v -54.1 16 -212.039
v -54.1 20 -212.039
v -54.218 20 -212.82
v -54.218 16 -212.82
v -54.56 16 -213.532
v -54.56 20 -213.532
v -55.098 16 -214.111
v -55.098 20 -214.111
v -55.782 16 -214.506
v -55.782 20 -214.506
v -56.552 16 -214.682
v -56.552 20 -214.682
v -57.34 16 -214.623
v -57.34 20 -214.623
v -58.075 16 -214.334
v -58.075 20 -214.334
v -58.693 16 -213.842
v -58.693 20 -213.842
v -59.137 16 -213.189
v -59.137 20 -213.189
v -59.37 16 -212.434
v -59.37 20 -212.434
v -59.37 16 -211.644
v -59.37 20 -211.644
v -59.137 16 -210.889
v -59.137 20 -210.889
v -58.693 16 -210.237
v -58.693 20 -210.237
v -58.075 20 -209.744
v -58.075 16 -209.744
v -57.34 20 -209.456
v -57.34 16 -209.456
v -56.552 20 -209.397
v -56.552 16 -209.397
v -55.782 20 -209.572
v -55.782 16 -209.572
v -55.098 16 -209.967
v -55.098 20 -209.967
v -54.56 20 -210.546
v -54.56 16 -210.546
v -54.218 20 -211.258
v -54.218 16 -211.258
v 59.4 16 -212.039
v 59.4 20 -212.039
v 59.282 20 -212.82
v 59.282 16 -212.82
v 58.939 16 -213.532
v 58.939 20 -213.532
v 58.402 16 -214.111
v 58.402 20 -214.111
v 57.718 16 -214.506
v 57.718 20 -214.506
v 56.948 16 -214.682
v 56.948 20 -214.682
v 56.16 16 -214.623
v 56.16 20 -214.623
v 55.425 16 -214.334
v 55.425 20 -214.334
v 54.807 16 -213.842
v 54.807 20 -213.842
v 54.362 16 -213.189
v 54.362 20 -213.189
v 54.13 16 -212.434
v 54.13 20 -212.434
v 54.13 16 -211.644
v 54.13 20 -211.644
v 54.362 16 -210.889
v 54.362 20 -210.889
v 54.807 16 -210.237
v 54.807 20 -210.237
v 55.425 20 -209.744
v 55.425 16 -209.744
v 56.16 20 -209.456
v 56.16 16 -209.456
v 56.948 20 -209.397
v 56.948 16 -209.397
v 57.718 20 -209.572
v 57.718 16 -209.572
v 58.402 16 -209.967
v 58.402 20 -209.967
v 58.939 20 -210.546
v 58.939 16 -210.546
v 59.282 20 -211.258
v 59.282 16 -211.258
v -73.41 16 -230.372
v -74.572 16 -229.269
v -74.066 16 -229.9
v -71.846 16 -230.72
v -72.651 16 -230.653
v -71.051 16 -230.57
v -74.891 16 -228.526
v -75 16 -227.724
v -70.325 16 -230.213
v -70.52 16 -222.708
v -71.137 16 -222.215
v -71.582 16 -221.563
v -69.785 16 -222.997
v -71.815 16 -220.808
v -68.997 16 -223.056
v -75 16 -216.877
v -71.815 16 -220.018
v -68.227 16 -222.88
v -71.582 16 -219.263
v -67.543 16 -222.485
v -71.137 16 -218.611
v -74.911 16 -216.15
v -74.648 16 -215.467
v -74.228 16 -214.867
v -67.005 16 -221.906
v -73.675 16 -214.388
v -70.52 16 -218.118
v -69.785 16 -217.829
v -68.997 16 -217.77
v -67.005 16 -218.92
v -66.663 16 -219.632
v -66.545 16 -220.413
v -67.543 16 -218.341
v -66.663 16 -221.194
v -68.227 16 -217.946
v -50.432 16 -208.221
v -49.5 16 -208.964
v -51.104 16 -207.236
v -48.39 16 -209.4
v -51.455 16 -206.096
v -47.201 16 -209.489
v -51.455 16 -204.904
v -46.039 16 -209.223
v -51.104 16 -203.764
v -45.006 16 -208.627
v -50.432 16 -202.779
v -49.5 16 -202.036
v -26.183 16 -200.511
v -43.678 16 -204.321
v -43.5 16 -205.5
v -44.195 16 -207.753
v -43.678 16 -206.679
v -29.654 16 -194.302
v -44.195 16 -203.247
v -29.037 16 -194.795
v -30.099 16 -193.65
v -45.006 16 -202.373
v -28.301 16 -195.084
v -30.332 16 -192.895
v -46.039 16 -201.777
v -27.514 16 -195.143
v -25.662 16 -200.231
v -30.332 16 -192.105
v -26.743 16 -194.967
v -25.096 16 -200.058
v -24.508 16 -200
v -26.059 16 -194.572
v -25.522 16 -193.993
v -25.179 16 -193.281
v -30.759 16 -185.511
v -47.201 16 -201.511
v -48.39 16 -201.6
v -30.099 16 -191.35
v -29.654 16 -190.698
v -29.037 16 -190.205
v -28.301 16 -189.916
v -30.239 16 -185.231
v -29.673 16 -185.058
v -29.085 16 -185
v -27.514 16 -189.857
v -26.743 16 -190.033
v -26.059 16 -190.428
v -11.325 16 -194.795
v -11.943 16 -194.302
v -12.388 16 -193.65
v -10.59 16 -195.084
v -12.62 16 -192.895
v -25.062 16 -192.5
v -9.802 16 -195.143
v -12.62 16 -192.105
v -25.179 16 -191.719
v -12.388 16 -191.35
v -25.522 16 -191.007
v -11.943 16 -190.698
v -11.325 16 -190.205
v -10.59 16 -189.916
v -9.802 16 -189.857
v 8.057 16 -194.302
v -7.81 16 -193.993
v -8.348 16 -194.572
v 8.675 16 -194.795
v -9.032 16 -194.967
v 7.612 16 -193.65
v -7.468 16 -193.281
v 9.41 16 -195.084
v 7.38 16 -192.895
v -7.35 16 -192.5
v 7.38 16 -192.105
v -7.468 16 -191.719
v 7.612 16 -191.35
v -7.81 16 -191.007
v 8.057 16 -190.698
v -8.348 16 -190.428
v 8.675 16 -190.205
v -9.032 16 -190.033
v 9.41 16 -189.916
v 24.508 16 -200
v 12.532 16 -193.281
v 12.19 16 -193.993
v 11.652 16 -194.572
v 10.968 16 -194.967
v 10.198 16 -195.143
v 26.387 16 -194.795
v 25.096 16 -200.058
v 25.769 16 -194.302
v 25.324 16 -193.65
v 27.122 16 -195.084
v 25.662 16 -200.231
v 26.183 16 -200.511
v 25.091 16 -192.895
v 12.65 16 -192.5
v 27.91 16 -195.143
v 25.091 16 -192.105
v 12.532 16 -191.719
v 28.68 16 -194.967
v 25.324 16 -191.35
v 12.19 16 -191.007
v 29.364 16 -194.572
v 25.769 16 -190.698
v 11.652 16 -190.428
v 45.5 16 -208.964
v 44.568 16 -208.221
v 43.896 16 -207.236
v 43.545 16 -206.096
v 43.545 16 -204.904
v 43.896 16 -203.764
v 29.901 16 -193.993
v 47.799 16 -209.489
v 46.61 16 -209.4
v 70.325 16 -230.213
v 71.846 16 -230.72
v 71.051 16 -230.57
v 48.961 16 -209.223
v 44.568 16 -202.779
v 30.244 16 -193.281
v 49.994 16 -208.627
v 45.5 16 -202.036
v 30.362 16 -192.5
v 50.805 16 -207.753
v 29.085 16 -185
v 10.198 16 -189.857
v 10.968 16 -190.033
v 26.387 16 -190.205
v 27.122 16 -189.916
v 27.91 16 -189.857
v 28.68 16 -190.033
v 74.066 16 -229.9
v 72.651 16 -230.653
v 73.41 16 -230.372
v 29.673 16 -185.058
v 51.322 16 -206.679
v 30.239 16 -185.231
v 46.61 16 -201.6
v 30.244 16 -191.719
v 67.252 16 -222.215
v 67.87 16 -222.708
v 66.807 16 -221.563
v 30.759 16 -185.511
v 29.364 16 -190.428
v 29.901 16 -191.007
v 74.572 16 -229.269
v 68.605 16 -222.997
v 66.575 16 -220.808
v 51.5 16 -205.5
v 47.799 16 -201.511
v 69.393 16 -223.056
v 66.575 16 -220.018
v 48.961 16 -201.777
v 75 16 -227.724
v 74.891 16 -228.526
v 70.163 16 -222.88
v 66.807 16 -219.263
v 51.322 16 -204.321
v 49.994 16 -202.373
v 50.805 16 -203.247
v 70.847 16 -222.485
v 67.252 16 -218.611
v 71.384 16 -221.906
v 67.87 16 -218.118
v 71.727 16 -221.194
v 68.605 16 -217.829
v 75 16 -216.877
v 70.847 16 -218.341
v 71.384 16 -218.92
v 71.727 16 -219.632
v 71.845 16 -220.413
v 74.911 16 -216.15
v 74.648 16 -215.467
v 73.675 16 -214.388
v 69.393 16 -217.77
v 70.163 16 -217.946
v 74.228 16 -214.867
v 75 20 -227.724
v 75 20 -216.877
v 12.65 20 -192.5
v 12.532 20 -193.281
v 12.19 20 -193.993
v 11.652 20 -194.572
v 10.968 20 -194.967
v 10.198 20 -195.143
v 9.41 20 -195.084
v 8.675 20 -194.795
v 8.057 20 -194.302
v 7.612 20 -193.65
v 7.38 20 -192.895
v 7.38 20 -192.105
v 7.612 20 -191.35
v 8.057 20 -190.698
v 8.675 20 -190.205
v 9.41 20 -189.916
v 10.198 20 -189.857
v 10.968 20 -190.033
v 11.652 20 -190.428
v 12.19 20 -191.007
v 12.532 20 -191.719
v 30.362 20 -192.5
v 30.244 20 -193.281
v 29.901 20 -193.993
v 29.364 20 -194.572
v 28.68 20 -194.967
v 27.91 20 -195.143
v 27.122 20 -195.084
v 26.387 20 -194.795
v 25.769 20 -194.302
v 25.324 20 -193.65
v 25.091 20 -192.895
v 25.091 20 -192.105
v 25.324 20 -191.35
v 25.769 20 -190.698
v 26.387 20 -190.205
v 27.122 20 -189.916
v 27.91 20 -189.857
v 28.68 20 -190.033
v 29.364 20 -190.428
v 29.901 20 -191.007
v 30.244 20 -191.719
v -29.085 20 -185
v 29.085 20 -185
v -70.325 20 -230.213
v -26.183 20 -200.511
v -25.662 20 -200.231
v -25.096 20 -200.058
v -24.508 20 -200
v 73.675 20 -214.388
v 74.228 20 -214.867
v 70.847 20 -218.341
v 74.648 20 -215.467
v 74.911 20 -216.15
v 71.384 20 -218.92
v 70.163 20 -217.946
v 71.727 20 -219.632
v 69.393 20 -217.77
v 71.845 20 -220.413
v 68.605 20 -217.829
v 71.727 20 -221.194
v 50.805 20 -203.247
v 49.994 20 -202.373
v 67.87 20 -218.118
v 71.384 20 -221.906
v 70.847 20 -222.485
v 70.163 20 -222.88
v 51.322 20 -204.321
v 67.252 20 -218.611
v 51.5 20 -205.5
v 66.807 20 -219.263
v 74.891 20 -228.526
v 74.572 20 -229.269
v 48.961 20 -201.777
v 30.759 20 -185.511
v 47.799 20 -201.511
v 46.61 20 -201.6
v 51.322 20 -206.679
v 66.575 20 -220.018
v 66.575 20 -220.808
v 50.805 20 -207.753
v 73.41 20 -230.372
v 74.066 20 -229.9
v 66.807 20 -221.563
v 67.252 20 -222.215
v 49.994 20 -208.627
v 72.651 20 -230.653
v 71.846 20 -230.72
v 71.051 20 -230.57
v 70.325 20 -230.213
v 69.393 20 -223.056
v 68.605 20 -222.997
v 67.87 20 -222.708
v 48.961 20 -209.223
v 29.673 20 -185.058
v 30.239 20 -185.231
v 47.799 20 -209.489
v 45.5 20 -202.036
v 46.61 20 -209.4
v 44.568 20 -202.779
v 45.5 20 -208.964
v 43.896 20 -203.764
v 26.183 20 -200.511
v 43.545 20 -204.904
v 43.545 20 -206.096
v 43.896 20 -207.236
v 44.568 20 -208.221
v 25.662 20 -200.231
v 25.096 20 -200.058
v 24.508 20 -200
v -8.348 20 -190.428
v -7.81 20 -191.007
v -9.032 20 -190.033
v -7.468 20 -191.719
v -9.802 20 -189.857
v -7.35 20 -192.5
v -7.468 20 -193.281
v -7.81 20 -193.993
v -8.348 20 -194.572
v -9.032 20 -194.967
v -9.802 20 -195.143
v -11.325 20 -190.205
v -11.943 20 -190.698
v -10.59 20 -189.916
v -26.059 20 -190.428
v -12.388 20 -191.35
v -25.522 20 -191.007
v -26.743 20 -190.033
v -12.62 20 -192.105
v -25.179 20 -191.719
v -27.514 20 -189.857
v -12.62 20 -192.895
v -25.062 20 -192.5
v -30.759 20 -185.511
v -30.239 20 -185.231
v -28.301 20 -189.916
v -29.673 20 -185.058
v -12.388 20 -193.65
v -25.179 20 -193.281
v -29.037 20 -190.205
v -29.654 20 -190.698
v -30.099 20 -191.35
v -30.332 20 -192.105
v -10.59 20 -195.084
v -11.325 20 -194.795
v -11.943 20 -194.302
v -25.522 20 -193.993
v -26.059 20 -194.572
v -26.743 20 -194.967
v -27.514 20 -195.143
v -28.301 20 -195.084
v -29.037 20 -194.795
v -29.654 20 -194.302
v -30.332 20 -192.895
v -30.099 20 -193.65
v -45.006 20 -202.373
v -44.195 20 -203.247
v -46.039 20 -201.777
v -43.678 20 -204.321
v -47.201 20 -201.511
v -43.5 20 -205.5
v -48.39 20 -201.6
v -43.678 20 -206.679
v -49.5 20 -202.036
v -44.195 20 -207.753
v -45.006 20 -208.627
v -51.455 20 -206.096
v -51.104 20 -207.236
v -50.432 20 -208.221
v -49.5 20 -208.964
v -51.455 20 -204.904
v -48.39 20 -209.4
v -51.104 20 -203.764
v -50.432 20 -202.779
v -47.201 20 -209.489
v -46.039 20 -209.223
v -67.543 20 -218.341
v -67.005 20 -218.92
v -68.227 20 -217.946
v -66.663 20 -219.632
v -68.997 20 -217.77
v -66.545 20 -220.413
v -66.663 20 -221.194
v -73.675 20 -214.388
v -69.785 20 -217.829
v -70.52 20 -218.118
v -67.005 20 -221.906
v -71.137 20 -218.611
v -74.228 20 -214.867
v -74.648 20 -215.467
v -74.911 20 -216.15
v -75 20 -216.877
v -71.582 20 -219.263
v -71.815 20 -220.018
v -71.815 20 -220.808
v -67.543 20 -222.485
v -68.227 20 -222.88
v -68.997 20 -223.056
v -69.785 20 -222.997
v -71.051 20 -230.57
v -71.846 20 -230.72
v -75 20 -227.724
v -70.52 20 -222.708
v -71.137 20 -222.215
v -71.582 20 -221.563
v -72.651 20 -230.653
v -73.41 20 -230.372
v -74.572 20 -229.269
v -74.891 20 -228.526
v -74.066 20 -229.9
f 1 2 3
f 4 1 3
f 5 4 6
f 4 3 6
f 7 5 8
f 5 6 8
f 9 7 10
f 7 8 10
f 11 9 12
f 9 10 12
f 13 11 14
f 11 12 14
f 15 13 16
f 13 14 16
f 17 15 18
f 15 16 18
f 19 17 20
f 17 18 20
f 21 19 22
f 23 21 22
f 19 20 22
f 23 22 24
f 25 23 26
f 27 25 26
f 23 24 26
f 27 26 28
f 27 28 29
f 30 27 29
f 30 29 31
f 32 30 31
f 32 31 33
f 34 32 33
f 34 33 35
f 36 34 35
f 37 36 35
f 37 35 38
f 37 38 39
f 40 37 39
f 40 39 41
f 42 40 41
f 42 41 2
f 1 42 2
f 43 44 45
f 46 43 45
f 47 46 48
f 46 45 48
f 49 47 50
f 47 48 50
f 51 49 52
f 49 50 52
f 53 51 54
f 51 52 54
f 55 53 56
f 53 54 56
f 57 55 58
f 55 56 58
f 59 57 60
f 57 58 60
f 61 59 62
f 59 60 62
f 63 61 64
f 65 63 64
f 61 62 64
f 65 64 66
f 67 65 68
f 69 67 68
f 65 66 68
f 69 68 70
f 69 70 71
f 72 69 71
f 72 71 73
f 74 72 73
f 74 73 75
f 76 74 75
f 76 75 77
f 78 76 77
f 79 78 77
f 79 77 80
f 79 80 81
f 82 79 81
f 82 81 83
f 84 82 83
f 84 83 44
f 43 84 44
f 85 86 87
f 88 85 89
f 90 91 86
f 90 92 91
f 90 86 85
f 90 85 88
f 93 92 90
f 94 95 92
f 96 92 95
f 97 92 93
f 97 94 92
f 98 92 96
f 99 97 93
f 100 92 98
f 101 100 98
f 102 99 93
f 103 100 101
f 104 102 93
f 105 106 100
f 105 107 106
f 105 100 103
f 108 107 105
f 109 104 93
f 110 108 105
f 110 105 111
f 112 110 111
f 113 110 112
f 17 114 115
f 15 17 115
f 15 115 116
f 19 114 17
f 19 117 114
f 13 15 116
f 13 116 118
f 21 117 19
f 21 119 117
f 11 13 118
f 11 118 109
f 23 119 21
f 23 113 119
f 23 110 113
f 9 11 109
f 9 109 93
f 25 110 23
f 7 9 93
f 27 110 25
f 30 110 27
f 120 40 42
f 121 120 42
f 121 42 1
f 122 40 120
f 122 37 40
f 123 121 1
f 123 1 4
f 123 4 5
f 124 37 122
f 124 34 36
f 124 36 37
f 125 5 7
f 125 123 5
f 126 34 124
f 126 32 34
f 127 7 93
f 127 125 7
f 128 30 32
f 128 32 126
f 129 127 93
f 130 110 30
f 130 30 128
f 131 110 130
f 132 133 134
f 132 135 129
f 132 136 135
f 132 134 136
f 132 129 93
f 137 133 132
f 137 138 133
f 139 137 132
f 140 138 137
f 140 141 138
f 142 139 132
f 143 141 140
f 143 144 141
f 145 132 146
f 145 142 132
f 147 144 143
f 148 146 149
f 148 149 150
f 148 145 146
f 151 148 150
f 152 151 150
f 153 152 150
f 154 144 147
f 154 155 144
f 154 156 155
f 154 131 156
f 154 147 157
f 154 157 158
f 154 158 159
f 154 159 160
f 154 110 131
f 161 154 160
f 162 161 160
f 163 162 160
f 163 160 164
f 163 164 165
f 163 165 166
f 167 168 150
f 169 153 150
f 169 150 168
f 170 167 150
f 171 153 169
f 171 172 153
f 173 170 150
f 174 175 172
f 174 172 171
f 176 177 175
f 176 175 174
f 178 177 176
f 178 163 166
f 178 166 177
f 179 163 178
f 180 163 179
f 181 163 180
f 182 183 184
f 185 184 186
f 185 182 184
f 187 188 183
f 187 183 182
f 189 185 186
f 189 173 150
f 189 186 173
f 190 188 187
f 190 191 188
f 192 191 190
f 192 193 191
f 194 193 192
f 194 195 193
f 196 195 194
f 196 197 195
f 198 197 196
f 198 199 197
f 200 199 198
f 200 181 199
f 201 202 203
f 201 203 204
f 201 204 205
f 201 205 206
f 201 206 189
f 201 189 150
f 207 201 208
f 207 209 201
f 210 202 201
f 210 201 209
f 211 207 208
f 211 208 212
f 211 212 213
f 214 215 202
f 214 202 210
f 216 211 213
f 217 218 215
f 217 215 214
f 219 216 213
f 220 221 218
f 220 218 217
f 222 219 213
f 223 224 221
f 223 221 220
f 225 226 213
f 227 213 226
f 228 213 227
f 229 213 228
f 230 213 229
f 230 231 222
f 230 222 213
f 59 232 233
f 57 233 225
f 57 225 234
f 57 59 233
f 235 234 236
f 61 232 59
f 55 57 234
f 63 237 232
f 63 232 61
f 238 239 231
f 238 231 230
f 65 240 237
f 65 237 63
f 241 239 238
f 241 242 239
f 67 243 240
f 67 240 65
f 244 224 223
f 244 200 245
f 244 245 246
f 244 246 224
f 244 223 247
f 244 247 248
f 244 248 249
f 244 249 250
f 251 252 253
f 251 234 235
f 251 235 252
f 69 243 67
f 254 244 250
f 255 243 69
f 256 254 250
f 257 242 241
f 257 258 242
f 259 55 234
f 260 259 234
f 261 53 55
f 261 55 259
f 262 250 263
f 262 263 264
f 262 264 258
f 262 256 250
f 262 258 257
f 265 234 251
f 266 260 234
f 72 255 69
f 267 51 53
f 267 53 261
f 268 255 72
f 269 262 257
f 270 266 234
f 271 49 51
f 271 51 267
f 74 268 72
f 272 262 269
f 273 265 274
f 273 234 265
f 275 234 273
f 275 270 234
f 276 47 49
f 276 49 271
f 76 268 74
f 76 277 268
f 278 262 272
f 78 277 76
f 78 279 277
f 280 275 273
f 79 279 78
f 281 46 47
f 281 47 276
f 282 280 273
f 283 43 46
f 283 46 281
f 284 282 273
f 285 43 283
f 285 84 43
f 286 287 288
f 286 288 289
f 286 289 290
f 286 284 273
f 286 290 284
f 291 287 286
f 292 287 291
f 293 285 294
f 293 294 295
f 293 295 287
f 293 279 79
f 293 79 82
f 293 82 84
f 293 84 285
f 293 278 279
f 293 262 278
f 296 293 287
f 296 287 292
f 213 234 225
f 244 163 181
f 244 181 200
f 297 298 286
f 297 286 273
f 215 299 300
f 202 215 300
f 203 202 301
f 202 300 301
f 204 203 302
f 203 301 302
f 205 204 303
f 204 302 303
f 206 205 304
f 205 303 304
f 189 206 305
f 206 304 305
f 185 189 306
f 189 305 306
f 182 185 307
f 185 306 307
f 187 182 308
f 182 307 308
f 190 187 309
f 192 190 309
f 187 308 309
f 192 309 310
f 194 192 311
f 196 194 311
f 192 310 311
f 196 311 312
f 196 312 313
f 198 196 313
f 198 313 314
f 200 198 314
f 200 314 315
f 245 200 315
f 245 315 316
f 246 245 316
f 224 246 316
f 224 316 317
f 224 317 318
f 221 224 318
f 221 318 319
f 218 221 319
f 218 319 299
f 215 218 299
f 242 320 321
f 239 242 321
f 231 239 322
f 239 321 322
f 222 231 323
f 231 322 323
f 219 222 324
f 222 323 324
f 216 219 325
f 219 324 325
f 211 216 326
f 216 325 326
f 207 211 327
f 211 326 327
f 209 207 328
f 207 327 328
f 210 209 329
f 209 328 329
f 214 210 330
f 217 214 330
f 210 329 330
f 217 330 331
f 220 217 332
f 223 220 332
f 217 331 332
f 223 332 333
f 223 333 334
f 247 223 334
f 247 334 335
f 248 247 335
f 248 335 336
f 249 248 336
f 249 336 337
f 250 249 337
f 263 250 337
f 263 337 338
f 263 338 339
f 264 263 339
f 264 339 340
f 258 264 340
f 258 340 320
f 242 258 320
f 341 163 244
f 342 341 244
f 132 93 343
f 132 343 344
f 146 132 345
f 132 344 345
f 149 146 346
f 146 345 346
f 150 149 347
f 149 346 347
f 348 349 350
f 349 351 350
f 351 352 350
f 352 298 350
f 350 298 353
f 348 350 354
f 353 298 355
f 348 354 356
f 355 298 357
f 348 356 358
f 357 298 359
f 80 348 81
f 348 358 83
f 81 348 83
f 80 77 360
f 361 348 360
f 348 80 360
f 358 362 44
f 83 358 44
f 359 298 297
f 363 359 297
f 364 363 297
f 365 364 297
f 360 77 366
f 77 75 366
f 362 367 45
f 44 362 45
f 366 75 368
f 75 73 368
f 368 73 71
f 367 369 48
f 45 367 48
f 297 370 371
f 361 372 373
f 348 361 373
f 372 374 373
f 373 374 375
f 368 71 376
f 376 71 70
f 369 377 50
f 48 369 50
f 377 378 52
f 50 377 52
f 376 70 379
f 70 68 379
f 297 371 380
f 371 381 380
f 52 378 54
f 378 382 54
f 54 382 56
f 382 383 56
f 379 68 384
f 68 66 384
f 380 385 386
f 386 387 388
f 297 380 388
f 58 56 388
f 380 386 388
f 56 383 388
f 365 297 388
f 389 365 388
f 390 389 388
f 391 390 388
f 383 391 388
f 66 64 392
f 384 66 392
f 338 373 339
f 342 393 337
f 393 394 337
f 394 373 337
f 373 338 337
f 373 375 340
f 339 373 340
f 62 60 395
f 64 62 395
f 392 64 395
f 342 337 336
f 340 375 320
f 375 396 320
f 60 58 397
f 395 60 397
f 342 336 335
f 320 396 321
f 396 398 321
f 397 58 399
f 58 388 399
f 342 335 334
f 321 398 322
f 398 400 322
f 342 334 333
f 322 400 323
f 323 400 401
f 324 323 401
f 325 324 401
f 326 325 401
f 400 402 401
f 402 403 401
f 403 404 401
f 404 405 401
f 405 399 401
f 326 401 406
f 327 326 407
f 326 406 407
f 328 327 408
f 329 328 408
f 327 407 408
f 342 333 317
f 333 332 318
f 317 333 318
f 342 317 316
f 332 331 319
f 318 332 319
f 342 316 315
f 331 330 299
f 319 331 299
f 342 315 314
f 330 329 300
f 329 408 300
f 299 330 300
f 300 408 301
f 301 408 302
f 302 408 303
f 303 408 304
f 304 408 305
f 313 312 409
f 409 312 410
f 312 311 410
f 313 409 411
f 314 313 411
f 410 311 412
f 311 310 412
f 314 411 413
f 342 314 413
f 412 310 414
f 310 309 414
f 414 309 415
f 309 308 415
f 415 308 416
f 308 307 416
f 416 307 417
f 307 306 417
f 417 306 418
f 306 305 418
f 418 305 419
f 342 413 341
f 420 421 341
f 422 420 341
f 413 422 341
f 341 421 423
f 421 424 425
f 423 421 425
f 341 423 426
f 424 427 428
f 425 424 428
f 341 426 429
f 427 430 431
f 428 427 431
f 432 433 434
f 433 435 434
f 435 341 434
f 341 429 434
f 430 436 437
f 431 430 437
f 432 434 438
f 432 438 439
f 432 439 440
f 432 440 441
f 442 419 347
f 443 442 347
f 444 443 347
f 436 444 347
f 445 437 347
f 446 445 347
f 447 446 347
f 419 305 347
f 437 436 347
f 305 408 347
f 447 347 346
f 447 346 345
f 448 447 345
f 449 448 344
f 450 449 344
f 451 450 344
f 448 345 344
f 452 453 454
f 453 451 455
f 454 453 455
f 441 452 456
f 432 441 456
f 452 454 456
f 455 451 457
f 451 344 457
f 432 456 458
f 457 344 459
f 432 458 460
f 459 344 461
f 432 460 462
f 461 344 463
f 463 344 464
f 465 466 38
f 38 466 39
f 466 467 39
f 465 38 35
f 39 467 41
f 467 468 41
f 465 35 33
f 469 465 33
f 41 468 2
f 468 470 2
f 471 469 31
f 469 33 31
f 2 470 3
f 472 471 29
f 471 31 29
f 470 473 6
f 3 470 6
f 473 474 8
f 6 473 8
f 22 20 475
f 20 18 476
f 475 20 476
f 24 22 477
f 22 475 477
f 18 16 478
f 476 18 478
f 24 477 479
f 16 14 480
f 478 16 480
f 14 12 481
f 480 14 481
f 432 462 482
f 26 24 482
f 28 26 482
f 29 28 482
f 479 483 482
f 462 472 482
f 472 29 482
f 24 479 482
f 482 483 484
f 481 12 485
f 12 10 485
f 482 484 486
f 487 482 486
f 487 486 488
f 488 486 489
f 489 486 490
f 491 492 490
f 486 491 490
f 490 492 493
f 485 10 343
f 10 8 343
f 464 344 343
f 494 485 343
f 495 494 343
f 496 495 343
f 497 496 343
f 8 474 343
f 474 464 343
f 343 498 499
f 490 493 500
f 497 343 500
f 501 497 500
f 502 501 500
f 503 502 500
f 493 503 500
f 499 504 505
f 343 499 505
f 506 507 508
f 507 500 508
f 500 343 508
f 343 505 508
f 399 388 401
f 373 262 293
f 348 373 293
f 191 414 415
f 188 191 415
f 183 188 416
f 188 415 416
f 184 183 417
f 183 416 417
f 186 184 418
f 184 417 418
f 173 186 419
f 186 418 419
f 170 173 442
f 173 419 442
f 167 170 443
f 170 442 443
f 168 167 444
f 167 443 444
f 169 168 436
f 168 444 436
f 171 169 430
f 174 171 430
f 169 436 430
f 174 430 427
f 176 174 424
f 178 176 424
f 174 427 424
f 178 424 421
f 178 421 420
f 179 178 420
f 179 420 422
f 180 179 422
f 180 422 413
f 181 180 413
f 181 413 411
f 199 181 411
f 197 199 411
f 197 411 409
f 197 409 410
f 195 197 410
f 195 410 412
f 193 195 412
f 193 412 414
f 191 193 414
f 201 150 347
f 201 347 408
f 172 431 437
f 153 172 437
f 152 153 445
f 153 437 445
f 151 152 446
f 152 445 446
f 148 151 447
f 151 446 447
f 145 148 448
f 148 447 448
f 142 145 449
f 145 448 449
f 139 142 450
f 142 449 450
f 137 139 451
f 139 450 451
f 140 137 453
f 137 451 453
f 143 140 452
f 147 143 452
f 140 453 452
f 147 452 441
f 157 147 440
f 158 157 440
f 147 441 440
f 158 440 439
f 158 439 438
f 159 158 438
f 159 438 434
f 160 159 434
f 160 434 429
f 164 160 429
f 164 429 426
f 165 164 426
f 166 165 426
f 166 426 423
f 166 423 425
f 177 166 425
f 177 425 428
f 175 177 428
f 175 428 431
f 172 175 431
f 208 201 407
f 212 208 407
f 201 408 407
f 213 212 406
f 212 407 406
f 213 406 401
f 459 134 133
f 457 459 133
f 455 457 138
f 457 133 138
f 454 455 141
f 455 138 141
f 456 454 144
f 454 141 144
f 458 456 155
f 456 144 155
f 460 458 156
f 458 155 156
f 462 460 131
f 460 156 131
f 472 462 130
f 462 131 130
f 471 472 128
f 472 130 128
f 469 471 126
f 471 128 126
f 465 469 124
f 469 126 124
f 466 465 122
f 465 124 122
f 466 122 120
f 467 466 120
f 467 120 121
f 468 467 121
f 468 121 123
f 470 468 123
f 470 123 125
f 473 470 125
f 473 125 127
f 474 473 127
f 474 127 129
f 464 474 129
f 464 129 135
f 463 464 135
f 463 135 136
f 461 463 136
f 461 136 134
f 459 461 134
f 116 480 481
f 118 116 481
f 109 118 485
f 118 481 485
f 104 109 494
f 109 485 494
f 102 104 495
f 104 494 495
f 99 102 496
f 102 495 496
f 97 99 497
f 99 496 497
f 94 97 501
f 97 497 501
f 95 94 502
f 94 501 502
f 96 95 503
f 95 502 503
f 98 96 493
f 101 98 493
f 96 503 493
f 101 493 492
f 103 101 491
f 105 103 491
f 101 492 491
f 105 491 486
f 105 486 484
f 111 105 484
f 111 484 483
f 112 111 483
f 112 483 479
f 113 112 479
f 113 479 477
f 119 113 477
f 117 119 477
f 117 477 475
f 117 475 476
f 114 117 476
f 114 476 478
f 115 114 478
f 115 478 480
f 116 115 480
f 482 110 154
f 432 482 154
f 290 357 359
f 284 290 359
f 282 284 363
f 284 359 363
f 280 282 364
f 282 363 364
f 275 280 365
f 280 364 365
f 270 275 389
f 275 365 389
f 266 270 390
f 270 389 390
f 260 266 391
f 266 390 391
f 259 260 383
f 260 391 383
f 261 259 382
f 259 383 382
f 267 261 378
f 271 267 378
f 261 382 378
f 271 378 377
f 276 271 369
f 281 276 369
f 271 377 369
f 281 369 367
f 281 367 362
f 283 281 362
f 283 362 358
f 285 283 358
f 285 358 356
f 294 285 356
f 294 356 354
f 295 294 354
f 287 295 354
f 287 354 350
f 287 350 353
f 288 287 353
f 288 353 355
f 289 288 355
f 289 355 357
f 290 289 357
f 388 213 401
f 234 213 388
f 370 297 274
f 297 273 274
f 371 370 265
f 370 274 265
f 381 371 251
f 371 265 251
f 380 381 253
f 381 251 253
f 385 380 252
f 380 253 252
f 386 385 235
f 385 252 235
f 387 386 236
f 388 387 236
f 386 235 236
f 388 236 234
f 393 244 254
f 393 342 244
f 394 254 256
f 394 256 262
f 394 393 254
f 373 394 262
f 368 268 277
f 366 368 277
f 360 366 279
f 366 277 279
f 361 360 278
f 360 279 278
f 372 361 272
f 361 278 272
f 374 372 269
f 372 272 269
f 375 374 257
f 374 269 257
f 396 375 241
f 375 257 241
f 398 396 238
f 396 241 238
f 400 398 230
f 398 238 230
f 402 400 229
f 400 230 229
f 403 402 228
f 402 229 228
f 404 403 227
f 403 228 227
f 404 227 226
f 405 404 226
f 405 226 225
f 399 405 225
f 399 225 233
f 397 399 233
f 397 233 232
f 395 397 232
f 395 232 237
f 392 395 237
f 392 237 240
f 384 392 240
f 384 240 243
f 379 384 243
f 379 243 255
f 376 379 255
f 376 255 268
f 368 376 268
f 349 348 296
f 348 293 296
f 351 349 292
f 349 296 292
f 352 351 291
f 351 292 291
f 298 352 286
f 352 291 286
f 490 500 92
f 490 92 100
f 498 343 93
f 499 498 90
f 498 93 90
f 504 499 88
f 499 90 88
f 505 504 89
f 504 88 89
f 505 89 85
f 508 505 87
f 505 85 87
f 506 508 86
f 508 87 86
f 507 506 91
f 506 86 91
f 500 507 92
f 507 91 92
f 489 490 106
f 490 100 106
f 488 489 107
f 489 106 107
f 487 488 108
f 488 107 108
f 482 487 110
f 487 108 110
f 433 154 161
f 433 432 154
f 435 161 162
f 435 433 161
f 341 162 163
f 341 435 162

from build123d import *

# Parameters (mm, degrees)
SKETCH_1_R               = 275
SKETCH_1_R_2             = 255
EXTRUDE_1_DEPTH          = 10
EXTRUDE_2_DEPTH          = 10
SKETCH_8_R               = 2.65
SKETCH_8_R_2             = 1.65
SKETCH_8_R_3             = 2.15
CUT_EXTRUDE_1_DEPTH      = 21
SKETCH_9_OUTSIDE_W       = 707.614
SKETCH_9_OUTSIDE_H       = 707.614
CUT_EXTRUDE_2_DEPTH      = 21
SKETCH_10_W              = 150
SKETCH_10_H              = 32
CUT_EXTRUDE_3_DEPTH      = 91
SKETCH_11_R              = 275
SKETCH_11_R_2            = 255
CUT_EXTRUDE_4_DEPTH      = 11
CUT_EXTRUDE_4_DEPTH_BACK = 11
FILLET_1_R               = 3
SKETCH_13_R              = 4
CUT_EXTRUDE_6_DEPTH      = 5


with BuildPart() as part:
    # 草图1 → 凸台-拉伸1 (new body)
    with BuildSketch(Plane(origin=(0, 0, 0), x_dir=(1, 0, 0), z_dir=(0, 1, 0))):
        Circle(SKETCH_1_R)
        Circle(SKETCH_1_R_2, mode=Mode.SUBTRACT)
    extrude(amount=EXTRUDE_1_DEPTH)

    # 草图11 → 切除-拉伸4 (cut, two sides)
    with BuildSketch(Plane(origin=(0, 10, 0), x_dir=(1, 0, 0), z_dir=(0, 1, 0))) as cut_extrude_4_sk:
        Circle(SKETCH_11_R)
        Circle(SKETCH_11_R_2, mode=Mode.SUBTRACT)
    extrude(amount=CUT_EXTRUDE_4_DEPTH, mode=Mode.SUBTRACT)
    extrude(cut_extrude_4_sk.sketch, amount=-CUT_EXTRUDE_4_DEPTH_BACK, mode=Mode.SUBTRACT)


with BuildPart() as body_2:
    # 草图2 → 凸台-拉伸2 (new body)
    with BuildSketch(Plane(origin=(0, 10, 0), x_dir=(1, 0, 0), z_dir=(0, 1, 0))):
        with BuildLine():
            Line((-110.525139894, 257.262887824), (-25.423255477, 200))
            Line((-25.423255477, 200), (0, 200))
            Line((0, 200), (25.423255477, 200))
            Line((25.423255477, 200), (110.525139894, 257.262887824))
            ThreePointArc((110.525139894, 257.262887824), (197.989898732, 197.989898732), (257.262887824, 110.525139894))
            Line((257.262887824, 110.525139894), (200, 25.423255477))
            Line((200, 25.423255477), (200, 0))
            Line((200, 0), (200, -25.423255477))
            Line((200, -25.423255477), (257.262887824, -110.525139894))
            ThreePointArc((257.262887824, -110.525139894), (197.989898732, -197.989898732), (110.525139894, -257.262887824))
            Line((110.525139894, -257.262887824), (25.423255477, -200))
            Line((25.423255477, -200), (0, -200))
            Line((0, -200), (-25.423255477, -200))
            Line((-25.423255477, -200), (-110.525139894, -257.262887824))
            ThreePointArc((-110.525139894, -257.262887824), (-197.989898732, -197.989898732), (-257.262887824, -110.525139894))
            Line((-257.262887824, -110.525139894), (-200, -25.423255477))
            Line((-200, -25.423255477), (-200, 25.423255477))
            Line((-200, 25.423255477), (-257.262887824, 110.525139894))
            ThreePointArc((-257.262887824, 110.525139894), (-197.989898732, 197.989898732), (-110.525139894, 257.262887824))
        make_face()
        with BuildLine():
            Line((0, 185), (30, 185))
            Line((30, 185), (111.993839361, 240.171563565))
            ThreePointArc((111.993839361, 240.171563565), (187.383297014, 187.383297014), (240.171563565, 111.993839361))
            Line((240.171563565, 111.993839361), (185, 30))
            Line((185, 30), (185, 0))
            Line((185, 0), (185, -30))
            Line((185, -30), (240.171563565, -111.993839361))
            ThreePointArc((240.171563565, -111.993839361), (187.383297014, -187.383297014), (111.993839361, -240.171563565))
            Line((111.993839361, -240.171563565), (30, -185))
            Line((30, -185), (0, -185))
            Line((0, -185), (-30, -185))
            Line((-30, -185), (-111.993839361, -240.171563565))
            ThreePointArc((-111.993839361, -240.171563565), (-187.383297014, -187.383297014), (-240.171563565, -111.993839361))
            Line((-240.171563565, -111.993839361), (-185, -30))
            Line((-185, -30), (-185, 30))
            Line((-185, 30), (-240.171563565, 111.993839361))
            ThreePointArc((-240.171563565, 111.993839361), (-187.383297014, 187.383297014), (-111.993839361, 240.171563565))
            Line((-111.993839361, 240.171563565), (-30, 185))
            Line((-30, 185), (0, 185))
        make_face(mode=Mode.SUBTRACT)
    extrude(amount=EXTRUDE_2_DEPTH)

    # 草图8 → 切除-拉伸1 (cut, through all)
    with BuildSketch(Plane(origin=(0, 20, 0), x_dir=(1, 0, 0), z_dir=(0, 1, 0))):
        with Locations((-10, 192.5)):
            Circle(SKETCH_8_R)
        with Locations((10, 192.5)):
            Circle(SKETCH_8_R)
        with Locations((-10, -192.5)):
            Circle(SKETCH_8_R)
        with Locations((10, -192.5)):
            Circle(SKETCH_8_R)
        with Locations((192.5, 10)):
            Circle(SKETCH_8_R)
        with Locations((192.5, -10)):
            Circle(SKETCH_8_R)
        with Locations((-192.5, 10)):
            Circle(SKETCH_8_R)
        with Locations((-192.5, -10)):
            Circle(SKETCH_8_R)
        with Locations((-110.525139894, 248.223100485)):
            Circle(SKETCH_8_R_2)
        with Locations((-27.711627738, 192.5)):
            Circle(SKETCH_8_R)
        with Locations((-56.749921469, 212.03912734)):
            Circle(SKETCH_8_R)
        with Locations((-69.194904497, 220.413039057)):
            Circle(SKETCH_8_R)
        with Locations((-81.639887524, 228.786950774)):
            Circle(SKETCH_8_R)
        with Locations((-146.077022117, 230.028561882)):
            Circle(SKETCH_8_R_3)
        with Locations((-164.415519771, 217.299729706)):
            Circle(SKETCH_8_R_3)
        with Locations((-183.638937552, 201.316607082)):
            Circle(SKETCH_8_R_3)
        with Locations((-201.316607082, 183.638937552)):
            Circle(SKETCH_8_R_3)
        with Locations((-217.299729706, 164.415519771)):
            Circle(SKETCH_8_R_3)
        with Locations((-230.028561882, 146.077022117)):
            Circle(SKETCH_8_R_3)
        with Locations((-128.811575358, 240.123330241)):
            Circle(SKETCH_8_R)
        with Locations((-240.123330241, 128.811575358)):
            Circle(SKETCH_8_R)
        with Locations((-228.786950774, 81.639887524)):
            Circle(SKETCH_8_R)
        with Locations((-220.413039057, 69.194904497)):
            Circle(SKETCH_8_R)
        with Locations((-212.03912734, 56.749921469)):
            Circle(SKETCH_8_R)
        with Locations((-203.665215623, 44.304938442)):
            Circle(SKETCH_8_R)
        with Locations((-192.5, 27.711627738)):
            Circle(SKETCH_8_R)
        with Locations((-248.223100485, 110.525139894)):
            Circle(SKETCH_8_R_2)
        with Locations((192.5, 27.711627738)):
            Circle(SKETCH_8_R)
        with Locations((248.223100485, 110.525139894)):
            Circle(SKETCH_8_R_2)
        with Locations((203.665215623, 44.304938442)):
            Circle(SKETCH_8_R)
        with Locations((212.03912734, 56.749921469)):
            Circle(SKETCH_8_R)
        with Locations((220.413039057, 69.194904497)):
            Circle(SKETCH_8_R)
        with Locations((228.786950774, 81.639887524)):
            Circle(SKETCH_8_R)
        with Locations((240.123330241, 128.811575358)):
            Circle(SKETCH_8_R)
        with Locations((230.028561882, 146.077022117)):
            Circle(SKETCH_8_R_3)
        with Locations((128.811575358, 240.123330241)):
            Circle(SKETCH_8_R)
        with Locations((201.316607082, 183.638937552)):
            Circle(SKETCH_8_R_3)
        with Locations((183.638937552, 201.316607082)):
            Circle(SKETCH_8_R_3)
        with Locations((164.415519771, 217.299729706)):
            Circle(SKETCH_8_R_3)
        with Locations((146.077022117, 230.028561882)):
            Circle(SKETCH_8_R_3)
        with Locations((81.639887524, 228.786950774)):
            Circle(SKETCH_8_R)
        with Locations((69.194904497, 220.413039057)):
            Circle(SKETCH_8_R)
        with Locations((56.749921469, 212.03912734)):
            Circle(SKETCH_8_R)
        with Locations((110.525139894, 248.223100485)):
            Circle(SKETCH_8_R_2)
        with Locations((27.711627738, 192.5)):
            Circle(SKETCH_8_R)
        with Locations((217.299729706, 164.415519771)):
            Circle(SKETCH_8_R_3)
    extrude(amount=-CUT_EXTRUDE_1_DEPTH, mode=Mode.SUBTRACT)

    # 草图9 outside → 切除-拉伸2 (cut, through all)
    with BuildSketch(Plane(origin=(0, 20, 0), x_dir=(1, 0, 0), z_dir=(0, 1, 0))):
        Rectangle(SKETCH_9_OUTSIDE_W, SKETCH_9_OUTSIDE_H)
        Polygon((-75, 233.358927123), (-75, 215.279352446), (-30, 185), (30, 185), (75, 215.279352446), (75, 233.358927123), (25.423255477, 200), (-25.423255477, 200), align=None, mode=Mode.SUBTRACT)
    extrude(amount=-CUT_EXTRUDE_2_DEPTH, mode=Mode.SUBTRACT)

    # 草图10 → 切除-拉伸3 (cut, through all)
    with BuildSketch(Plane.XY.offset(-185)):
        Rectangle(SKETCH_10_W, SKETCH_10_H)
    extrude(amount=-CUT_EXTRUDE_3_DEPTH, mode=Mode.SUBTRACT)

    # 圆角1
    fillet_1_edges = [body_2.edges().sort_by_distance(p)[0] for p in [
        (-25.423255477, 18, -200),
        (25.423255477, 18, -200),
        (-75, 18, -215.279352446),
        (75, 18, -233.358927123),
        (75, 18, -215.279352446),
        (-75, 18, -233.358927123),
        (30, 18, -185),
        (-30, 18, -185),
    ]]
    fillet(fillet_1_edges, radius=FILLET_1_R)

    # 草图13 → 切除-拉伸6 (cut, through all)
    with BuildSketch(Plane.XZ.offset(-16)):
        with Locations((-47.5, -205.5)):
            Circle(SKETCH_13_R)
        with Locations((47.5, -205.5)):
            Circle(SKETCH_13_R)
    extrude(amount=-CUT_EXTRUDE_6_DEPTH, mode=Mode.SUBTRACT)


solid = body_2.part
